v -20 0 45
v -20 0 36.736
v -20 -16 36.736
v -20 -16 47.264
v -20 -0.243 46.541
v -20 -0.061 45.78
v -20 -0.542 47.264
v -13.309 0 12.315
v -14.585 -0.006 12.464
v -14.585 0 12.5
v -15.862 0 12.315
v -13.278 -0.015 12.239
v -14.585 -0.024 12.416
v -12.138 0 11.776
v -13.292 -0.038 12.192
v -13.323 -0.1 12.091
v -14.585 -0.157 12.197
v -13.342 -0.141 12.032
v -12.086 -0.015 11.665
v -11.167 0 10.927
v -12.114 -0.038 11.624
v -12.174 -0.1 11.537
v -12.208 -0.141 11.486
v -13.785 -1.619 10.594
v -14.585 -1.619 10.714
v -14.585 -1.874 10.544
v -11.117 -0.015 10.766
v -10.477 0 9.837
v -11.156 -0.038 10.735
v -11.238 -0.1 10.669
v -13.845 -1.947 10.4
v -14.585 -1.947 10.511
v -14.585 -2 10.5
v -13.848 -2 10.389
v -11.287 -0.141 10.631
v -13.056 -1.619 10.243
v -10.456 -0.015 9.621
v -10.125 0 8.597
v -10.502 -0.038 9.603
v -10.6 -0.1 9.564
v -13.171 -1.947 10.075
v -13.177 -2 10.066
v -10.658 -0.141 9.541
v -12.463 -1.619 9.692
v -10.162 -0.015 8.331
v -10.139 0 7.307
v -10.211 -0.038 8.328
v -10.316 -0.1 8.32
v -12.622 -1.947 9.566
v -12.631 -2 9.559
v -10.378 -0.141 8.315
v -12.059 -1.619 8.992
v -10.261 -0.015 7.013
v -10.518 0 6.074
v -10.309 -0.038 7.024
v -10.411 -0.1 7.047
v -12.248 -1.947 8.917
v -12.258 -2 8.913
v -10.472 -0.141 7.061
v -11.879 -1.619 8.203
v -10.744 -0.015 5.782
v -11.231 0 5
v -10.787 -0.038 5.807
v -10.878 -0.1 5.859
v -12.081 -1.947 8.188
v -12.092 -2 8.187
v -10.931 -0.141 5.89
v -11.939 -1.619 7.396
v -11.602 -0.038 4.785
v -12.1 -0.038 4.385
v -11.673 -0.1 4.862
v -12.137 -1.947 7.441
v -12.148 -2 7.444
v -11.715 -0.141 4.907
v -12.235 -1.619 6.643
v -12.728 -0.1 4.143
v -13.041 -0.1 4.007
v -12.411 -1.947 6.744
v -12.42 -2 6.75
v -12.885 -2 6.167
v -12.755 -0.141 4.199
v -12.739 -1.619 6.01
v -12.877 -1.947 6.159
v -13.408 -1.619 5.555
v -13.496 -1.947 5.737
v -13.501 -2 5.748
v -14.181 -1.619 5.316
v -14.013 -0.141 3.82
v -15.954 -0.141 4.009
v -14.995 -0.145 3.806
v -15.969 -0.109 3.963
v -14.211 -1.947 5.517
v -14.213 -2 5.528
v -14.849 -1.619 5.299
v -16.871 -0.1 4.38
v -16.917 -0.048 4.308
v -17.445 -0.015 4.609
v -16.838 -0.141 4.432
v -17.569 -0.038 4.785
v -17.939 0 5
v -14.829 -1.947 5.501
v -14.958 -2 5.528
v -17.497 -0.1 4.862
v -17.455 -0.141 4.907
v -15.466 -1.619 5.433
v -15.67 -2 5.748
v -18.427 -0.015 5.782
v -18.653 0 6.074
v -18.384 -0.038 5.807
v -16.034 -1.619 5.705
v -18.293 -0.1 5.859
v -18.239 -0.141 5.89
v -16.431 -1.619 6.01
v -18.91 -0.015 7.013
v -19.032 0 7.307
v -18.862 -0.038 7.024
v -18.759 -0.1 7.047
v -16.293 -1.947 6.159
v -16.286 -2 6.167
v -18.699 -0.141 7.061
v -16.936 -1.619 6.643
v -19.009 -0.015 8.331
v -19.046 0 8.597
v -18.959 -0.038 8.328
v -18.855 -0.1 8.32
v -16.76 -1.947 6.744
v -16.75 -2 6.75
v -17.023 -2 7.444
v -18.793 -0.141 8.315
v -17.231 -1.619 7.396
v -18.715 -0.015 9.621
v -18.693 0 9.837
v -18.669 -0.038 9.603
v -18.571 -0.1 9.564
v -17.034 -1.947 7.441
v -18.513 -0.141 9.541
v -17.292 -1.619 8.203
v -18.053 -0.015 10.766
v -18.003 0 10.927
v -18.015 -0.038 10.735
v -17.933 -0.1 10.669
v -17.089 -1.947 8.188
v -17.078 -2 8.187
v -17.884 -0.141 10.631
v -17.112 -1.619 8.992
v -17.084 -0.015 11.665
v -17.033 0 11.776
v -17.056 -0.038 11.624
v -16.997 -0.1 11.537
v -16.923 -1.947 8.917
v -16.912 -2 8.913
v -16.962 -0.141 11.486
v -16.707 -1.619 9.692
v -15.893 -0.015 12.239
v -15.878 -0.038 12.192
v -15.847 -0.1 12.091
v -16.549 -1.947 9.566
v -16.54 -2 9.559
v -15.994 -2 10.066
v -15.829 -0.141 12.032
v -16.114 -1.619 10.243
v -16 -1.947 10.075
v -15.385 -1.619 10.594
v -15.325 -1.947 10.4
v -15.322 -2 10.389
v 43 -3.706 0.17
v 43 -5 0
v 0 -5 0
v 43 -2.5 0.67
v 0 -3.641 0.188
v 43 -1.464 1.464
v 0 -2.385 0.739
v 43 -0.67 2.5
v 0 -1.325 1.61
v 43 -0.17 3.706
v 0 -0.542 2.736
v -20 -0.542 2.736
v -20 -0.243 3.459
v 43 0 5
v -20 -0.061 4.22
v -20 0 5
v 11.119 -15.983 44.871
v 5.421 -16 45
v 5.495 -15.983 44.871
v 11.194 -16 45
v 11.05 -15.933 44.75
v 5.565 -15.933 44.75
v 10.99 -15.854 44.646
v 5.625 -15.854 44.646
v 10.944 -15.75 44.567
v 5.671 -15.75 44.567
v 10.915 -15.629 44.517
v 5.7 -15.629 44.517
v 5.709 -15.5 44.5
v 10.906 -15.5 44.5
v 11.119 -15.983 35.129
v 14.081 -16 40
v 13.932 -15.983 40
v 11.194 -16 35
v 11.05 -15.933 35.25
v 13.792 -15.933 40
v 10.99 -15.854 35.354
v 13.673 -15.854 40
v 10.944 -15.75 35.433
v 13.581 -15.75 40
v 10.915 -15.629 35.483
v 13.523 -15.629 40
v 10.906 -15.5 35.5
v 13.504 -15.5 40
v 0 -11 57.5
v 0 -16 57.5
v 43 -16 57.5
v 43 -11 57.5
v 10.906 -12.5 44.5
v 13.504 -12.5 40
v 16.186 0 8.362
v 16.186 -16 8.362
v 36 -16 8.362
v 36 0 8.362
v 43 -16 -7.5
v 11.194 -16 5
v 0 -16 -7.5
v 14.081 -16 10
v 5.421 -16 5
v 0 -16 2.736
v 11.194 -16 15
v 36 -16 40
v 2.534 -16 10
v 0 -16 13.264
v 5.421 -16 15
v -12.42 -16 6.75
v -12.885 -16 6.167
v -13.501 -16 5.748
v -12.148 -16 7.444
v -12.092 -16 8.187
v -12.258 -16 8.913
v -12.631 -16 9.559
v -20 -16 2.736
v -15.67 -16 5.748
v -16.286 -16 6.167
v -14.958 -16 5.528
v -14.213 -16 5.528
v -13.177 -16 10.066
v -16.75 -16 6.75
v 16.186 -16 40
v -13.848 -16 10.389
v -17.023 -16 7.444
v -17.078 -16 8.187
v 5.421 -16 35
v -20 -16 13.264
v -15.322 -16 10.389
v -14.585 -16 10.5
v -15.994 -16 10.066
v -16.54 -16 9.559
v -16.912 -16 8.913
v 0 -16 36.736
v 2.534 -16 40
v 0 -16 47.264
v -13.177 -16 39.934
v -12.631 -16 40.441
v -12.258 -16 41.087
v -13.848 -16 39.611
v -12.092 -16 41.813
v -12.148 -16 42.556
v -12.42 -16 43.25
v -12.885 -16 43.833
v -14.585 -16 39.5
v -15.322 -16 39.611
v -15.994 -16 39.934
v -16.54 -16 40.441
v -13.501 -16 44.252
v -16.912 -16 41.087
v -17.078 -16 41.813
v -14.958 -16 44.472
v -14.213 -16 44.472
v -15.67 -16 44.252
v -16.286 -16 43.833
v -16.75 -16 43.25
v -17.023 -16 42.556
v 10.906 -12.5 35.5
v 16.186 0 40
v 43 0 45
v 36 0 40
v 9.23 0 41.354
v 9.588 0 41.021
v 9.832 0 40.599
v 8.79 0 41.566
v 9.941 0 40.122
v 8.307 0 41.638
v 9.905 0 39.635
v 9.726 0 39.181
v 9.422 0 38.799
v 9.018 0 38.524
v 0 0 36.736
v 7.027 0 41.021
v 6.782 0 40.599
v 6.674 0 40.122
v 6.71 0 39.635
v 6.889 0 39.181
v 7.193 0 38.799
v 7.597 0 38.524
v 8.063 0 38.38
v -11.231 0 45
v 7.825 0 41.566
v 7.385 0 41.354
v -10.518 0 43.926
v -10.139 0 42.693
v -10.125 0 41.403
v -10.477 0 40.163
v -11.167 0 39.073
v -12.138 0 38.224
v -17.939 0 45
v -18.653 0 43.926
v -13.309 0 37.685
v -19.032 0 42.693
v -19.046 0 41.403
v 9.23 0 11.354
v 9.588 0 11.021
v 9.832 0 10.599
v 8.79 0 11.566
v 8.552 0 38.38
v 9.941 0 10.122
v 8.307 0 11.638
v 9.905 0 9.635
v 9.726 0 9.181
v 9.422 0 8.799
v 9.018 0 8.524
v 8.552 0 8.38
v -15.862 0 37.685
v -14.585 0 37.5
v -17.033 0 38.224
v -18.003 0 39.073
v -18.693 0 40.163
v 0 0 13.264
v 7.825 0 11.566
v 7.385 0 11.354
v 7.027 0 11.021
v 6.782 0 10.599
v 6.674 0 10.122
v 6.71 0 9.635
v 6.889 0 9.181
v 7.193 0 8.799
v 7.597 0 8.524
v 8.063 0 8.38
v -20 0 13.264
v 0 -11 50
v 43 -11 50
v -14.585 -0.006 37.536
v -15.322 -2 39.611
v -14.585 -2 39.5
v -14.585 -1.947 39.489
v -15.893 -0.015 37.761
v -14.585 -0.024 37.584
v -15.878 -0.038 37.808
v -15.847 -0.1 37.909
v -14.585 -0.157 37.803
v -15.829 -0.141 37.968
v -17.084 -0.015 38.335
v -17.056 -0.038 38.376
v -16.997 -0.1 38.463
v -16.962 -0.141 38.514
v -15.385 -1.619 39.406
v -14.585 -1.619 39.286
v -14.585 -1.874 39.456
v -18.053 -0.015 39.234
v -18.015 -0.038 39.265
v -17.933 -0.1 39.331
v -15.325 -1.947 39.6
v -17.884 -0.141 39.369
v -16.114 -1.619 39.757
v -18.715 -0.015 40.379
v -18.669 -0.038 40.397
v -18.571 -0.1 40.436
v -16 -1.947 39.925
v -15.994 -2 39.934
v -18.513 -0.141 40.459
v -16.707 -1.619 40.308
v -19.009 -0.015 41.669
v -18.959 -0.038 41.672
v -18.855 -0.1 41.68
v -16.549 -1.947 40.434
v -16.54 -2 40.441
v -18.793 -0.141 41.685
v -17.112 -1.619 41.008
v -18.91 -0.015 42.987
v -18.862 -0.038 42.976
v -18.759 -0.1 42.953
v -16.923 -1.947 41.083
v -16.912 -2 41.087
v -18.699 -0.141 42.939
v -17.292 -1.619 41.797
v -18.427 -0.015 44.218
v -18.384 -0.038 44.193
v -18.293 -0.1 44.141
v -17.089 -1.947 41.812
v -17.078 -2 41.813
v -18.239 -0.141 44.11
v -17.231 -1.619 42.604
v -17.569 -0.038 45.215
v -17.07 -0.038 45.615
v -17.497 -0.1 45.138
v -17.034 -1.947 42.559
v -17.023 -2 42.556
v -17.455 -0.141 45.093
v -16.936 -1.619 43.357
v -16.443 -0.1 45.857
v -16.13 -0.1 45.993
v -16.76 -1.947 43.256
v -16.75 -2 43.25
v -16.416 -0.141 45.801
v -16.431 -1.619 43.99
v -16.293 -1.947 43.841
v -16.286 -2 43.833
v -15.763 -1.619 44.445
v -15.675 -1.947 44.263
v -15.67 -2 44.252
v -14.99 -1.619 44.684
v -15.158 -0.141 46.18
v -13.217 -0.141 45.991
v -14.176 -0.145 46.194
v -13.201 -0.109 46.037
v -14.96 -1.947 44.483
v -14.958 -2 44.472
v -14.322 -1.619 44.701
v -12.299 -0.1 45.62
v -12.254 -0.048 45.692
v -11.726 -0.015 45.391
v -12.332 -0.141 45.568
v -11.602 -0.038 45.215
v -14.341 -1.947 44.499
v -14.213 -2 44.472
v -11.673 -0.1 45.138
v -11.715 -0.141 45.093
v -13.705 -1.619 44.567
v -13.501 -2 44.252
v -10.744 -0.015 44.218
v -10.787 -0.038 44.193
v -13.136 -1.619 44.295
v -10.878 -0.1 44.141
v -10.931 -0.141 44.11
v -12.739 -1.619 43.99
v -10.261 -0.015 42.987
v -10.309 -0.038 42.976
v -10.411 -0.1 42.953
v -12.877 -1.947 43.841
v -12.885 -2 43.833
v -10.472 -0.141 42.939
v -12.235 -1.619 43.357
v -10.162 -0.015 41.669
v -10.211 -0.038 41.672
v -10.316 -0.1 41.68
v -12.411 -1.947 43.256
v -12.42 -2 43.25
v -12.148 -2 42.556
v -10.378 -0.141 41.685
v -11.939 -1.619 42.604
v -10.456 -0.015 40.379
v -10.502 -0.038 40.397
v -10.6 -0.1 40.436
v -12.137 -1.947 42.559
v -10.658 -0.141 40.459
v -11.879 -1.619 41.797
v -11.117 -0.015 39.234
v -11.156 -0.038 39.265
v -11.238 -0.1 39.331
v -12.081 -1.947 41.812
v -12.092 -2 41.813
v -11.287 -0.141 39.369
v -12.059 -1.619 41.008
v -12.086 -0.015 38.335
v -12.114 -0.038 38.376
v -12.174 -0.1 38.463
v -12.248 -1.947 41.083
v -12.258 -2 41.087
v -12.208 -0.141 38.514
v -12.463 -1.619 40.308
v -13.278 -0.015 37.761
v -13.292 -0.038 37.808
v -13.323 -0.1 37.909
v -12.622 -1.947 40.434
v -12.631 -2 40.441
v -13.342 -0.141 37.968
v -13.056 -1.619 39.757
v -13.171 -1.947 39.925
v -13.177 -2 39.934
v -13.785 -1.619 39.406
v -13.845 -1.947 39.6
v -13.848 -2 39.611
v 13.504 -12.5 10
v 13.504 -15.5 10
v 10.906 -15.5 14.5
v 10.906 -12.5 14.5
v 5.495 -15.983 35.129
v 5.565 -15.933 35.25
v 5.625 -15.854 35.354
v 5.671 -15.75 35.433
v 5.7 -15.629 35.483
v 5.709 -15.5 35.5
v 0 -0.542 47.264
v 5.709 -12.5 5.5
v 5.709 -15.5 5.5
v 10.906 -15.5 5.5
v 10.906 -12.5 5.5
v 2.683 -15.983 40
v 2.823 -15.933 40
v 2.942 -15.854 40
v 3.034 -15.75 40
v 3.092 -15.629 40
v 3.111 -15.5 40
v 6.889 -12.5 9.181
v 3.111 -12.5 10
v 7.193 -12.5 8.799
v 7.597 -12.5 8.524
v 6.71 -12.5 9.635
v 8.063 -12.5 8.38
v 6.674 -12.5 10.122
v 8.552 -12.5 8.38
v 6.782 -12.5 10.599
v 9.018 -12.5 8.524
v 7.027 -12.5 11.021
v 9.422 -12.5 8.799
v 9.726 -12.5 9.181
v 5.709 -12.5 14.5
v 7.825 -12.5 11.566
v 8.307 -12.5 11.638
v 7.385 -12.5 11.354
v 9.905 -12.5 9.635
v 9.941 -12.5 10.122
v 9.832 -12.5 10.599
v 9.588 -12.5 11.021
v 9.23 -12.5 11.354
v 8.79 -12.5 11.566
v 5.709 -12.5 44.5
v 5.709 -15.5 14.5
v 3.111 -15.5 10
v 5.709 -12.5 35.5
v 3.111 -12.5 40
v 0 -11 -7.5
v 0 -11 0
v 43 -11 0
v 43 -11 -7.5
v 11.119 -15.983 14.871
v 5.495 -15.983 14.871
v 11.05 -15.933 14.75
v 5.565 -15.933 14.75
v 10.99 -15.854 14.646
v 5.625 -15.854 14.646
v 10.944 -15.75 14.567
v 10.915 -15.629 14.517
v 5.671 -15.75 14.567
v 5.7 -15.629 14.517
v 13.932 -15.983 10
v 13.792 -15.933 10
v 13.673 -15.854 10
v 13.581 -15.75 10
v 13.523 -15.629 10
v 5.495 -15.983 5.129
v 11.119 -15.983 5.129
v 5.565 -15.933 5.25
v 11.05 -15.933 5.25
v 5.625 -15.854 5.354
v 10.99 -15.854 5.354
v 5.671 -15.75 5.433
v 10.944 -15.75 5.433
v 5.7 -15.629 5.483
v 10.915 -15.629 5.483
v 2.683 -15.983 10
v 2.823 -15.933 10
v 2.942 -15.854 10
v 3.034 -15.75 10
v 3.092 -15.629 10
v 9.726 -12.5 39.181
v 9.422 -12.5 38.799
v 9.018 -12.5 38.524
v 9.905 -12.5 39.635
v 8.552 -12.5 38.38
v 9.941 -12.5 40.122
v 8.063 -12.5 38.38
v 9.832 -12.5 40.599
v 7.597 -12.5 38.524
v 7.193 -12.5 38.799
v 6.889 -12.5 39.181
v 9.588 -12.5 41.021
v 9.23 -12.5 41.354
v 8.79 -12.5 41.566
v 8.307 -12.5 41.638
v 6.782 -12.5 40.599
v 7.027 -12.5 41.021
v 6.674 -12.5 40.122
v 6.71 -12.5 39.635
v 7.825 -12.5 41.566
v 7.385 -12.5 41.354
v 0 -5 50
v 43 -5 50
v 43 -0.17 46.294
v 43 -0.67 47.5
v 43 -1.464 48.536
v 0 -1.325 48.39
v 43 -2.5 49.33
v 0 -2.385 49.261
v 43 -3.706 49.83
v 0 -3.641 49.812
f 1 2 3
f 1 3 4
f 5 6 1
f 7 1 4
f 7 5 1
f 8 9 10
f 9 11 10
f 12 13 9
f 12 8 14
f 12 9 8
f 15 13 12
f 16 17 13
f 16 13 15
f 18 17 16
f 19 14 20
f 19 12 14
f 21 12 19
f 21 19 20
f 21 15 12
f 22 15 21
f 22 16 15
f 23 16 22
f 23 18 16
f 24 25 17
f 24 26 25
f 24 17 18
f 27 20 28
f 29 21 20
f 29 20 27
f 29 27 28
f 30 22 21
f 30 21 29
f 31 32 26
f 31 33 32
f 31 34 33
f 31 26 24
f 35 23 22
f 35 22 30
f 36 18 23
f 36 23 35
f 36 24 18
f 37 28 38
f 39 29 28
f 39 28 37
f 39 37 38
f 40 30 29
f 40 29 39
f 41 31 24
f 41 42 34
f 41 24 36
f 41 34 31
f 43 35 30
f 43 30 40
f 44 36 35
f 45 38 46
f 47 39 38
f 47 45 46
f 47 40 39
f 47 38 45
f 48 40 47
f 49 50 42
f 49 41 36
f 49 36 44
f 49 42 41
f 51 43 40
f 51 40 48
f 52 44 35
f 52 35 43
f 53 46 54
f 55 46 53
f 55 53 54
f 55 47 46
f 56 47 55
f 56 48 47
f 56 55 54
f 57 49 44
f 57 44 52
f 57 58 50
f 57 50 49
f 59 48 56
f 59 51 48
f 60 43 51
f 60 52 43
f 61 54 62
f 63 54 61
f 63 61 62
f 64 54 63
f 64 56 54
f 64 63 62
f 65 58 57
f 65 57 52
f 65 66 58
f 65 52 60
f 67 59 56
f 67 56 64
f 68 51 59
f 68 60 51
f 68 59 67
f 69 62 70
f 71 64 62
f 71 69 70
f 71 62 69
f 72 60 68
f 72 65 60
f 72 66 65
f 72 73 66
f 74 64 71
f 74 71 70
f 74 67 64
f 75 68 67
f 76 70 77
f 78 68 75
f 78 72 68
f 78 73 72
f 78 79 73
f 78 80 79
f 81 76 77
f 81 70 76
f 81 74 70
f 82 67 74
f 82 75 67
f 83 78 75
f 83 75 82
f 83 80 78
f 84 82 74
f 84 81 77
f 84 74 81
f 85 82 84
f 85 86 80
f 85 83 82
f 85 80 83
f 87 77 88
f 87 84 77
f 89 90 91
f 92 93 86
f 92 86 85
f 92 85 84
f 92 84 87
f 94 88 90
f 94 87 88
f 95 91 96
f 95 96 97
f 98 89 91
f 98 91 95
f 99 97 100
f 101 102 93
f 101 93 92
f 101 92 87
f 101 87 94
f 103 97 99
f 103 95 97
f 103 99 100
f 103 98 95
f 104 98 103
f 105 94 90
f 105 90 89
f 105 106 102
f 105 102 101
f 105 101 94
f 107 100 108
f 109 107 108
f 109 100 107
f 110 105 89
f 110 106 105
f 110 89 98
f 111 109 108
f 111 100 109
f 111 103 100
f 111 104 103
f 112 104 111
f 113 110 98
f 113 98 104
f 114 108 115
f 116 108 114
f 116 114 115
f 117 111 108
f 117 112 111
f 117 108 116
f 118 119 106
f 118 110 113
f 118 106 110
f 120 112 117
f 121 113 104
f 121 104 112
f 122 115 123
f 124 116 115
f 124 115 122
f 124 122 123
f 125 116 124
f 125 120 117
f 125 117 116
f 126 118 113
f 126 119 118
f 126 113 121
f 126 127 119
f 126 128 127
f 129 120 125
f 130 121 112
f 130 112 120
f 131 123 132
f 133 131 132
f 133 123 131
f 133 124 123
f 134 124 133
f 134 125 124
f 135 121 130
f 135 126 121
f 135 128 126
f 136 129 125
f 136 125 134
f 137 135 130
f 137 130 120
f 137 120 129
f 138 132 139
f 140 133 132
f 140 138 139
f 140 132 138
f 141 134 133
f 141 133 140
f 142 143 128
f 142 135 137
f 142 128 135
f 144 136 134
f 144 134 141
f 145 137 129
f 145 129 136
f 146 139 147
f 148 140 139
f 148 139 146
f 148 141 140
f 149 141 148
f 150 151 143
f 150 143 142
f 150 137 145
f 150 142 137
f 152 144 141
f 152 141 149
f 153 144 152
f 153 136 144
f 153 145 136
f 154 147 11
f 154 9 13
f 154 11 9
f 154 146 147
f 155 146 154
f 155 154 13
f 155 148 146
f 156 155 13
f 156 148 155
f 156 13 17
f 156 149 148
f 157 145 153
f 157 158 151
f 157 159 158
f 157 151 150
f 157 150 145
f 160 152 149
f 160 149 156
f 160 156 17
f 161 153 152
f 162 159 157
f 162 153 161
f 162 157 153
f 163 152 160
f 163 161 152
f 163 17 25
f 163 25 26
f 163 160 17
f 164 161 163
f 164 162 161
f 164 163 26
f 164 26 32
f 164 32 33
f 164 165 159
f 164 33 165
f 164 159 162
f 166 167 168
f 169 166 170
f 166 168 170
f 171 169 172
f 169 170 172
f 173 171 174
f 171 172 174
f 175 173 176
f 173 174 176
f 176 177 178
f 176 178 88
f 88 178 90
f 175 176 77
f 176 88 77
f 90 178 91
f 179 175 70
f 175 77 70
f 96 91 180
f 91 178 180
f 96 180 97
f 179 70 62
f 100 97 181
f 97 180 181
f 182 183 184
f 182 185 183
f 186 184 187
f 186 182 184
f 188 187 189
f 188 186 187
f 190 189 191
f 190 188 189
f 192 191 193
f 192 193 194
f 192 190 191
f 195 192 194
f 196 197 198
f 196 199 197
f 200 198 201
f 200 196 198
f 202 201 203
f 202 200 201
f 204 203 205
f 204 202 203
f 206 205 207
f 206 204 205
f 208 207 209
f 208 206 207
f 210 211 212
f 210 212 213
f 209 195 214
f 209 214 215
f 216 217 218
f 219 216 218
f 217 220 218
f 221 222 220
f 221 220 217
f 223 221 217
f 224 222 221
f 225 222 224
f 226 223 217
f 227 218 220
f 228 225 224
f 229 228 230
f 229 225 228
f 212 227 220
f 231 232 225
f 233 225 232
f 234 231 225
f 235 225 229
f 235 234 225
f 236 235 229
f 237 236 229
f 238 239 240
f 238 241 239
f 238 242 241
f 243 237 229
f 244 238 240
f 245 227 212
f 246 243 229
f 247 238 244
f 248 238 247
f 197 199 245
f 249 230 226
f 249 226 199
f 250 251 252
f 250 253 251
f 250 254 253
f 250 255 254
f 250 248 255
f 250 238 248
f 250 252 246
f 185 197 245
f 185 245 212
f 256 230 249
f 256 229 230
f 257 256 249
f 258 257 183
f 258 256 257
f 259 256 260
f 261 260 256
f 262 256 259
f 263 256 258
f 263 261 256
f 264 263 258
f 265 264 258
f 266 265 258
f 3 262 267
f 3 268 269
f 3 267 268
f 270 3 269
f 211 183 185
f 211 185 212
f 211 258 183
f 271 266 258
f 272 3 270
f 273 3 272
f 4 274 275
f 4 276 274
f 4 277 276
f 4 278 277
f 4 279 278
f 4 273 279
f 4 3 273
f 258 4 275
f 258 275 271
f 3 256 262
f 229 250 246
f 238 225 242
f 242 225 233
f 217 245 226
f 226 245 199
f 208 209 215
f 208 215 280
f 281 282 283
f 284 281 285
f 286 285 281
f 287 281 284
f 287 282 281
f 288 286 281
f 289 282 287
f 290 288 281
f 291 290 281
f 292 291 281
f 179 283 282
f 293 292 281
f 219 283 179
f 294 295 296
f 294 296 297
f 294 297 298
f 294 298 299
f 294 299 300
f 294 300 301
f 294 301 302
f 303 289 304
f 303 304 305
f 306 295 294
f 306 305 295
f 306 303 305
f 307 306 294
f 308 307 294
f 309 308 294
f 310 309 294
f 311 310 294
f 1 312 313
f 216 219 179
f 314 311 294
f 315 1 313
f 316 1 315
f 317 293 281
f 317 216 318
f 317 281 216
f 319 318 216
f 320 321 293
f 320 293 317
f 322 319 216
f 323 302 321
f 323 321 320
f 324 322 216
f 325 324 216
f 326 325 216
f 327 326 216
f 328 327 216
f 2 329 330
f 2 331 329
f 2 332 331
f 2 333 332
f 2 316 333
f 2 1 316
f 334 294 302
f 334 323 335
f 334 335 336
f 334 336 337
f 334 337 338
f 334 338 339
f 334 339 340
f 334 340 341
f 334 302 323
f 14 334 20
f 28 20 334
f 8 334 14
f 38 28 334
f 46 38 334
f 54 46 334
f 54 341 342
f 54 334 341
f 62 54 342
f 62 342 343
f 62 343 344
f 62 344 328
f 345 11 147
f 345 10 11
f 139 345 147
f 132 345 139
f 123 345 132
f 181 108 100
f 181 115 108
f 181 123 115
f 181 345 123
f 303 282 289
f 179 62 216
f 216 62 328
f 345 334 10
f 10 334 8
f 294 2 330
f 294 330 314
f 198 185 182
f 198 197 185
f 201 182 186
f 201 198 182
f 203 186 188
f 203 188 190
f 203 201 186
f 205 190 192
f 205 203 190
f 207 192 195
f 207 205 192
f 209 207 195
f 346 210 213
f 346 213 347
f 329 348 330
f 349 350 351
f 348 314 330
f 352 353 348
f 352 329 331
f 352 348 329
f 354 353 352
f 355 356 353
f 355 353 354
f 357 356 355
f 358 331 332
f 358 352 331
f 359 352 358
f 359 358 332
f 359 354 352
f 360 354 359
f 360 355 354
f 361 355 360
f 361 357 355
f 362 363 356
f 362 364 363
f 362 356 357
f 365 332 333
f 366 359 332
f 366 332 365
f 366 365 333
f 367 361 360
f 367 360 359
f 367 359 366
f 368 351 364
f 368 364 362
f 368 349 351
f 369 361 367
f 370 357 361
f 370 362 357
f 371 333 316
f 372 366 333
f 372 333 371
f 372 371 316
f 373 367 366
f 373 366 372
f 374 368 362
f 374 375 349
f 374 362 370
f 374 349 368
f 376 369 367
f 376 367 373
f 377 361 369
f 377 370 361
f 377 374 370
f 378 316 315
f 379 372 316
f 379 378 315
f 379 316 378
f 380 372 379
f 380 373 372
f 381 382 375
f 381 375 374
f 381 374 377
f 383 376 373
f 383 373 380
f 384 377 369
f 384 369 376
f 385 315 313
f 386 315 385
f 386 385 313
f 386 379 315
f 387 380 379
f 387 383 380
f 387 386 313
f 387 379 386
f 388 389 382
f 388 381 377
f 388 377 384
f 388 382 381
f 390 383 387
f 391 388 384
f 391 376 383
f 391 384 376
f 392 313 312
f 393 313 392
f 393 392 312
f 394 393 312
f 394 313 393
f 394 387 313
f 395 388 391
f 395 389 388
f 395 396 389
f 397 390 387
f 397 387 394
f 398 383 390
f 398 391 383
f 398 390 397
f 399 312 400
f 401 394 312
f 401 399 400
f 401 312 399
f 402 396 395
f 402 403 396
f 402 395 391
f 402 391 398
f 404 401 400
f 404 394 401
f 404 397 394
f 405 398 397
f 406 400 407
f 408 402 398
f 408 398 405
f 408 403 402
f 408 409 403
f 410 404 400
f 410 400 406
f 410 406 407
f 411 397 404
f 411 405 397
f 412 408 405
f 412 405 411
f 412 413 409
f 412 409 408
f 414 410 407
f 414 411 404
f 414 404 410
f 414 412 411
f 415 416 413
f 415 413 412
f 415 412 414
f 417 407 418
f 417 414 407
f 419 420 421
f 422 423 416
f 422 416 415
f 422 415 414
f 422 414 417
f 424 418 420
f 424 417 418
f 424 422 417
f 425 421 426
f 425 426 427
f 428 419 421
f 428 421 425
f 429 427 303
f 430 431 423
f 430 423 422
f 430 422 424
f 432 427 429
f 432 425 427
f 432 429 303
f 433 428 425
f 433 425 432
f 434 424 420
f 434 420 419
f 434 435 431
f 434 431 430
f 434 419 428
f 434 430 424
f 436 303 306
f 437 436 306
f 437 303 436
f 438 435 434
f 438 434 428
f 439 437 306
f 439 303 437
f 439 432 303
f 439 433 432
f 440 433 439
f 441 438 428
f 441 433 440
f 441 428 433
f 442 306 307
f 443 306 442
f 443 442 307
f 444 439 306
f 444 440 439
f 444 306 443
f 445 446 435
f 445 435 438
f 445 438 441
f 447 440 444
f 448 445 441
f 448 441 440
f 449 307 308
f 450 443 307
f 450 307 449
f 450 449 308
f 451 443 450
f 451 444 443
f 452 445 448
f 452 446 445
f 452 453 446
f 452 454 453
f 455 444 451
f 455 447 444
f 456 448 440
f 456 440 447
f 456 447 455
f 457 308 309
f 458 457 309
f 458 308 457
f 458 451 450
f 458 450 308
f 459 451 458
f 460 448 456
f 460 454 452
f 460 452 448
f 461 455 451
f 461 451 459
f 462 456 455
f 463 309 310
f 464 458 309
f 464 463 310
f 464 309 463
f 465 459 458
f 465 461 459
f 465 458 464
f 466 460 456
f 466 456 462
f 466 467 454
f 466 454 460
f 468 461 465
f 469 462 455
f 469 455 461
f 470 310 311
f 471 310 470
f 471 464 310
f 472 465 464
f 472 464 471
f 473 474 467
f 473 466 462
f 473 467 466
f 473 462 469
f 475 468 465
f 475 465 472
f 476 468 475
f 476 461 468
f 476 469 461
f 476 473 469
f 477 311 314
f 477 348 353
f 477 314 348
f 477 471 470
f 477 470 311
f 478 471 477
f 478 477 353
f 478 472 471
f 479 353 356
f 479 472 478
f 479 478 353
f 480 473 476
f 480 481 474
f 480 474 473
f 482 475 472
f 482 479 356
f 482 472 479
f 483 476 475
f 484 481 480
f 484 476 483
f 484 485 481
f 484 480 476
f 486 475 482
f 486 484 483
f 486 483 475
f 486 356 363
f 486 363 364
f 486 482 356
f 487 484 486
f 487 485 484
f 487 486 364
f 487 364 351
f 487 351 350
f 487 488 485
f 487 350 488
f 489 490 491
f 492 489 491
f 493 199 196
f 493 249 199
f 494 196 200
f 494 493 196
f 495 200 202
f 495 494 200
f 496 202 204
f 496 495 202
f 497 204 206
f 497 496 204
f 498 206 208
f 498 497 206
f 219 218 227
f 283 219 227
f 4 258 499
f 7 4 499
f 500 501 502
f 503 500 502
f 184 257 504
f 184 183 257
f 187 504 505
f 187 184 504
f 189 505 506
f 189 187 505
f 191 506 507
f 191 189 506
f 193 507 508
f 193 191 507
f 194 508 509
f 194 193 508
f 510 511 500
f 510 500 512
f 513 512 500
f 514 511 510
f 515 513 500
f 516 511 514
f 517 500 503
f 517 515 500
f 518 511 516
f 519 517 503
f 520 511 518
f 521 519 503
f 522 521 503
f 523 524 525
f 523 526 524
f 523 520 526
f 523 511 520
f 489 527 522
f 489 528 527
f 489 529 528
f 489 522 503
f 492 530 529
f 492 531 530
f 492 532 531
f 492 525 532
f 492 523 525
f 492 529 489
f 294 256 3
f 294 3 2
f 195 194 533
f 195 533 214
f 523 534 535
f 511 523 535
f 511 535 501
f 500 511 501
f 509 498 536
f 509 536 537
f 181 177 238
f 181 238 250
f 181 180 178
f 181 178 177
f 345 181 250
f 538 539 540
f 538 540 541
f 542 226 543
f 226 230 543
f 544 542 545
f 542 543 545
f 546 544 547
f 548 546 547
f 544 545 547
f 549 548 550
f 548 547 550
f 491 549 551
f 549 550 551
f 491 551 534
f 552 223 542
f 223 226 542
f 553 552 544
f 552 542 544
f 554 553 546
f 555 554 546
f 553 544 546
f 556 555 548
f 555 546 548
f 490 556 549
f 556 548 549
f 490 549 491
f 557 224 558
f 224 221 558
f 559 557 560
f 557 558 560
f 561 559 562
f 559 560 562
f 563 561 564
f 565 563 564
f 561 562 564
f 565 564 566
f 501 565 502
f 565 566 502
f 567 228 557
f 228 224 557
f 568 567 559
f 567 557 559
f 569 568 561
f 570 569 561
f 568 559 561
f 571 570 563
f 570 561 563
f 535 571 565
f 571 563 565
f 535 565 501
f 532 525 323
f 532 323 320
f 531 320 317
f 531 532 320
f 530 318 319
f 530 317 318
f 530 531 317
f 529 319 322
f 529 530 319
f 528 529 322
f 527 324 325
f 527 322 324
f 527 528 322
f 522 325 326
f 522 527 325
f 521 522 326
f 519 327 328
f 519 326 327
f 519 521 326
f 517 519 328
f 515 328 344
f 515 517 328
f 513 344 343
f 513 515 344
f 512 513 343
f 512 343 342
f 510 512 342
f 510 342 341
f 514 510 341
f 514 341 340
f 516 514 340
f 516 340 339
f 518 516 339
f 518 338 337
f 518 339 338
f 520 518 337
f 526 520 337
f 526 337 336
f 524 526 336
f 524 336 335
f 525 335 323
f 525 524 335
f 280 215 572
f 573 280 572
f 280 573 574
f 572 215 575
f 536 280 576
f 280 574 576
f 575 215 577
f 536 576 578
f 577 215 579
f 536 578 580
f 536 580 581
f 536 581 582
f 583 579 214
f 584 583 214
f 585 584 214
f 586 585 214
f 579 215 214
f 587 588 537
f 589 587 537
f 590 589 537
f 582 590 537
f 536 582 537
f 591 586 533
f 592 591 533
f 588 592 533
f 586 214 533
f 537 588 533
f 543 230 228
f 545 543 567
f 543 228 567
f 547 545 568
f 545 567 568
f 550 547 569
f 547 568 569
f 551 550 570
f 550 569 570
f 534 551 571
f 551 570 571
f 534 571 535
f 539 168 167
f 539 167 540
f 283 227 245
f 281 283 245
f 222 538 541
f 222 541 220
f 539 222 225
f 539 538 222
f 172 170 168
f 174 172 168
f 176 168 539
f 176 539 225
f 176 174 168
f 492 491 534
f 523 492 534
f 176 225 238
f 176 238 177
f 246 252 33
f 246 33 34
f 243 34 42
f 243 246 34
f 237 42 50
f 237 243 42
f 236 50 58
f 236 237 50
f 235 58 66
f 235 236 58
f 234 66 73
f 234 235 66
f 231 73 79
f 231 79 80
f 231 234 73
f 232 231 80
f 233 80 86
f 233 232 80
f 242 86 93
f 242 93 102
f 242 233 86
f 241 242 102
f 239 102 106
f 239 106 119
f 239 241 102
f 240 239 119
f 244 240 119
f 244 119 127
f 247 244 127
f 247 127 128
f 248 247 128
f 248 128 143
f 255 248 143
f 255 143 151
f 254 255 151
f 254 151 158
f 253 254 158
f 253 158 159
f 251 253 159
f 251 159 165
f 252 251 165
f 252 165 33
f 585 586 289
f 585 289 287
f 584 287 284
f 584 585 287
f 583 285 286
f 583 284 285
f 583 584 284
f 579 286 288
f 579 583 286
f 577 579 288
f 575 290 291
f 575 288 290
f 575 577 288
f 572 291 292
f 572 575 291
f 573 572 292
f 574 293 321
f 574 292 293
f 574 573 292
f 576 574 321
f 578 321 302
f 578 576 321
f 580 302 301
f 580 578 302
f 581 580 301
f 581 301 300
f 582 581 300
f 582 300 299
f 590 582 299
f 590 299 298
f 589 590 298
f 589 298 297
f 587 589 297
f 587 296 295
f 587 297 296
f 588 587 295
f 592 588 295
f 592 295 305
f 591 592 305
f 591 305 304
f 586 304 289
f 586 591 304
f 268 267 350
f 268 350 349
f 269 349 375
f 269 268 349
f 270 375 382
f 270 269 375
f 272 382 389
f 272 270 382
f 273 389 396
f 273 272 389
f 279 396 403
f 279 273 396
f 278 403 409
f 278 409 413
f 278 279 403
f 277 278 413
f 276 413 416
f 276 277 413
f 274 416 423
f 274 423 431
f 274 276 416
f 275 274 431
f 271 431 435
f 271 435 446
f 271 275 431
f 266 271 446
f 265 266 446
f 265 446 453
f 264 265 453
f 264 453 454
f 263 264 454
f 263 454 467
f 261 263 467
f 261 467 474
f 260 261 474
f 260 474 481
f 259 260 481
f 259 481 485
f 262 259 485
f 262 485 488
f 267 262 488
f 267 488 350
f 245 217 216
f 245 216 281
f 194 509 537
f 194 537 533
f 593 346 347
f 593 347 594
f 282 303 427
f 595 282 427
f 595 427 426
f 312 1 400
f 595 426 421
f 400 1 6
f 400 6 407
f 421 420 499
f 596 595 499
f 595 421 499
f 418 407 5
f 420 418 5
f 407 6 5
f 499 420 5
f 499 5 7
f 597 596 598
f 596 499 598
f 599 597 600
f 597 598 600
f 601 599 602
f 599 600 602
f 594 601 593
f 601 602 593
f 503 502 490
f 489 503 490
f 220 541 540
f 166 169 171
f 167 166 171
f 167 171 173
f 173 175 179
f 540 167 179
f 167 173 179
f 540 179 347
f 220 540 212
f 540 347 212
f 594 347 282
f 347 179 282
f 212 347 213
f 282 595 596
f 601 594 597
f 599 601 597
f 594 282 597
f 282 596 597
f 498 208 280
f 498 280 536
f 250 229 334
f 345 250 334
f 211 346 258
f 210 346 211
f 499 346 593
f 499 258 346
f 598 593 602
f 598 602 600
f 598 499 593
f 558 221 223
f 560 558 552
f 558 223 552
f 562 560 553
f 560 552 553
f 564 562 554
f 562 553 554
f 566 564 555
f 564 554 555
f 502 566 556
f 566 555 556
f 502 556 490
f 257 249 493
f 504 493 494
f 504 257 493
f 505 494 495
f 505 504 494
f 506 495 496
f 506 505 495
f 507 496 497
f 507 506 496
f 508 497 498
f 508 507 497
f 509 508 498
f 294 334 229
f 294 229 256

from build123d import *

# Parameters (mm, degrees)
BOSS_EXTRUDE1_DEPTH     = 43
CUT_EXTRUDE6_DEPTH      = 74.561199011
CUT_EXTRUDE6_DEPTH_BACK = 74.561199011
SKETCH8_R               = 1.6383
SKETCH15_W              = 10.528106576
SKETCH15_H              = 16
BOSS_EXTRUDE2_DEPTH     = 20
CUT_EXTRUDE7_DEPTH      = 74.561199011
CUT_EXTRUDE7_DEPTH_BACK = 74.561199011
SKETCH16_R              = 2.5
FILLET5_SIZE            = 2
FILLET6_SIZE            = 2
CUT_EXTRUDE8_DEPTH      = 3.5
FILLET7_R               = 0.5
FILLET8_R               = 0.5
CUT_EXTRUDE9_DEPTH      = 74.561199011
CUT_EXTRUDE9_DEPTH_BACK = 74.561199011
FILLET9_R               = 5


with BuildPart() as part:
    # Sketch1 → Boss-Extrude1 (new body)
    with BuildSketch(Plane(origin=(0, 0, 0), x_dir=(0, 0, -1), z_dir=(1, 0, 0))):
        Polygon((-50, 0), (0, 0), (0, -11), (7.5, -11), (7.5, -16), (-57.5, -16), (-57.5, -11), (-50, -11), align=None)
    extrude(amount=BOSS_EXTRUDE1_DEPTH)

    # Sketch8 → Cut-Extrude6 (cut, two sides: drawn at the far end of the back side and taken through both)
    with BuildSketch(Plane(origin=(0, 0, 0), x_dir=(1, 0, 0), z_dir=(0, 1, 0)).offset(-CUT_EXTRUDE6_DEPTH_BACK)):
        with Locations(Location((8.307443012, -40, 0), (0, 0, 270))):
            Circle(SKETCH8_R)
        with Locations(Location((8.307443012, -10, 0), (0, 0, 270))):
            Circle(SKETCH8_R)
    extrude(amount=CUT_EXTRUDE6_DEPTH + CUT_EXTRUDE6_DEPTH_BACK, mode=Mode.SUBTRACT)

    # Sketch15 → Boss-Extrude2 (add)
    with BuildSketch(Plane.ZY):
        with Locations((42, -8)):
            Rectangle(SKETCH15_W, SKETCH15_H)
        with Locations((8, -8)):
            Rectangle(SKETCH15_W, SKETCH15_H)
    extrude(amount=BOSS_EXTRUDE2_DEPTH)

    # Sketch16 → Cut-Extrude7 (cut, two sides: drawn at the far end of the back side and taken through both)
    with BuildSketch(Plane(origin=(0, 0, 0), x_dir=(1, 0, 0), z_dir=(0, 1, 0)).offset(-CUT_EXTRUDE7_DEPTH_BACK)):
        with Locations(Location((-14.585283135, -8, 0), (0, 0, 270))):
            Circle(SKETCH16_R)
        with Locations(Location((-14.585283135, -42, 0), (0, 0, 90))):
            Circle(SKETCH16_R)
    extrude(amount=CUT_EXTRUDE7_DEPTH + CUT_EXTRUDE7_DEPTH_BACK, mode=Mode.SUBTRACT)

    # Fillet5
    # a fillet whose section is not a circle: 2 mm, written as the material it takes off along each edge
    with BuildSketch(Plane(origin=(-14.585283135, 0, 8), x_dir=(0, 0, 1), z_dir=(-1, 0, 0))) as fillet5_piece_1:
        with BuildLine():
            Bezier((2.5 + FILLET5_SIZE, 0), (2.5, 0), (2.5, -FILLET5_SIZE), weights=[1, 0.141421356, 1])
            Line((2.5, -FILLET5_SIZE), (2.5, 0))
            Line((2.5, 0), (2.5 + FILLET5_SIZE, 0))
        make_face()
    revolve(axis=Axis((-14.585283135, 0, 8), (0, 1, 0)), mode=Mode.SUBTRACT)

    # Fillet6
    # a fillet whose section is not a circle: 2 mm, written as the material it takes off along each edge
    with BuildSketch(Plane(origin=(-14.585283135, 0, 42), x_dir=(0, 0, -1), z_dir=(1, 0, 0))) as fillet6_piece_1:
        with BuildLine():
            Bezier((2.5 + FILLET6_SIZE, 0), (2.5, 0), (2.5, -FILLET6_SIZE), weights=[1, 0.141421356, 1])
            Line((2.5, -FILLET6_SIZE), (2.5, 0))
            Line((2.5, 0), (2.5 + FILLET6_SIZE, 0))
        make_face()
    revolve(axis=Axis((-14.585283135, 0, 42), (0, 1, 0)), mode=Mode.SUBTRACT)

    # Sketch20 → Cut-Extrude8 (cut)
    with BuildSketch(Plane.XZ.offset(16)):
        Polygon((13.503595435, 10), (10.905519224, 14.5), (5.709366801, 14.5), (3.11129059, 10), (5.709366801, 5.5), (10.905519224, 5.5), align=None)
        Polygon((10.905519224, 44.5), (13.503595435, 40), (10.905519224, 35.5), (5.709366801, 35.5), (3.11129059, 40), (5.709366801, 44.5), align=None)
    extrude(amount=-CUT_EXTRUDE8_DEPTH, mode=Mode.SUBTRACT)

    # Fillet7
    fillet7_edges = [part.edges().sort_by_distance(p)[0] for p in [
        (12.204557329, -16, 7.75),
        (12.204557329, -16, 12.25),
        (8.307443012, -16, 14.5),
        (4.410328695, -16, 12.25),
        (4.410328695, -16, 7.75),
        (8.307443012, -16, 5.5),
    ]]
    fillet(fillet7_edges, radius=FILLET7_R)

    # Fillet8
    fillet8_edges = [part.edges().sort_by_distance(p)[0] for p in [
        (8.307443012, -16, 44.5),
        (4.410328695, -16, 42.25),
        (4.410328695, -16, 37.75),
        (8.307443012, -16, 35.5),
        (12.204557329, -16, 37.75),
        (12.204557329, -16, 42.25),
    ]]
    fillet(fillet8_edges, radius=FILLET8_R)

    # Sketch21 → Cut-Extrude9 (cut, two sides: drawn at the far end of the back side and taken through both)
    with BuildSketch(Plane(origin=(0, 0, 0), x_dir=(1, 0, 0), z_dir=(0, 1, 0)).offset(-CUT_EXTRUDE9_DEPTH_BACK)):
        Polygon((16.186241981, -25), (16.186241981, -8.3617), (36, -8.3617), (36, -40), (16.186241981, -40), align=None)
    extrude(amount=CUT_EXTRUDE9_DEPTH + CUT_EXTRUDE9_DEPTH_BACK, mode=Mode.SUBTRACT)

    # Fillet9
    # the kernel refuses this fillet: 5 mm, written as the material it takes off along each edge
    with BuildSketch(Plane(origin=(-30, 0, 50), x_dir=(0, 0, -1), z_dir=(1, 0, 0)), Plane(origin=(-30, 0, 0), x_dir=(0, -1, 0), z_dir=(1, 0, 0))) as fillet9_piece_1:
        with BuildLine():
            CenterArc((FILLET9_R, -FILLET9_R), FILLET9_R, 90, 90)
            Line((0, -FILLET9_R), (-FILLET9_R * 0.02, -FILLET9_R))
            Line((-FILLET9_R * 0.02, -FILLET9_R), (-FILLET9_R * 0.02, FILLET9_R * 0.02))
            Line((-FILLET9_R * 0.02, FILLET9_R * 0.02), (FILLET9_R, FILLET9_R * 0.02))
            Line((FILLET9_R, FILLET9_R * 0.02), (FILLET9_R, 0))
        make_face()
    extrude(amount=103, mode=Mode.SUBTRACT)


solid = part.part
